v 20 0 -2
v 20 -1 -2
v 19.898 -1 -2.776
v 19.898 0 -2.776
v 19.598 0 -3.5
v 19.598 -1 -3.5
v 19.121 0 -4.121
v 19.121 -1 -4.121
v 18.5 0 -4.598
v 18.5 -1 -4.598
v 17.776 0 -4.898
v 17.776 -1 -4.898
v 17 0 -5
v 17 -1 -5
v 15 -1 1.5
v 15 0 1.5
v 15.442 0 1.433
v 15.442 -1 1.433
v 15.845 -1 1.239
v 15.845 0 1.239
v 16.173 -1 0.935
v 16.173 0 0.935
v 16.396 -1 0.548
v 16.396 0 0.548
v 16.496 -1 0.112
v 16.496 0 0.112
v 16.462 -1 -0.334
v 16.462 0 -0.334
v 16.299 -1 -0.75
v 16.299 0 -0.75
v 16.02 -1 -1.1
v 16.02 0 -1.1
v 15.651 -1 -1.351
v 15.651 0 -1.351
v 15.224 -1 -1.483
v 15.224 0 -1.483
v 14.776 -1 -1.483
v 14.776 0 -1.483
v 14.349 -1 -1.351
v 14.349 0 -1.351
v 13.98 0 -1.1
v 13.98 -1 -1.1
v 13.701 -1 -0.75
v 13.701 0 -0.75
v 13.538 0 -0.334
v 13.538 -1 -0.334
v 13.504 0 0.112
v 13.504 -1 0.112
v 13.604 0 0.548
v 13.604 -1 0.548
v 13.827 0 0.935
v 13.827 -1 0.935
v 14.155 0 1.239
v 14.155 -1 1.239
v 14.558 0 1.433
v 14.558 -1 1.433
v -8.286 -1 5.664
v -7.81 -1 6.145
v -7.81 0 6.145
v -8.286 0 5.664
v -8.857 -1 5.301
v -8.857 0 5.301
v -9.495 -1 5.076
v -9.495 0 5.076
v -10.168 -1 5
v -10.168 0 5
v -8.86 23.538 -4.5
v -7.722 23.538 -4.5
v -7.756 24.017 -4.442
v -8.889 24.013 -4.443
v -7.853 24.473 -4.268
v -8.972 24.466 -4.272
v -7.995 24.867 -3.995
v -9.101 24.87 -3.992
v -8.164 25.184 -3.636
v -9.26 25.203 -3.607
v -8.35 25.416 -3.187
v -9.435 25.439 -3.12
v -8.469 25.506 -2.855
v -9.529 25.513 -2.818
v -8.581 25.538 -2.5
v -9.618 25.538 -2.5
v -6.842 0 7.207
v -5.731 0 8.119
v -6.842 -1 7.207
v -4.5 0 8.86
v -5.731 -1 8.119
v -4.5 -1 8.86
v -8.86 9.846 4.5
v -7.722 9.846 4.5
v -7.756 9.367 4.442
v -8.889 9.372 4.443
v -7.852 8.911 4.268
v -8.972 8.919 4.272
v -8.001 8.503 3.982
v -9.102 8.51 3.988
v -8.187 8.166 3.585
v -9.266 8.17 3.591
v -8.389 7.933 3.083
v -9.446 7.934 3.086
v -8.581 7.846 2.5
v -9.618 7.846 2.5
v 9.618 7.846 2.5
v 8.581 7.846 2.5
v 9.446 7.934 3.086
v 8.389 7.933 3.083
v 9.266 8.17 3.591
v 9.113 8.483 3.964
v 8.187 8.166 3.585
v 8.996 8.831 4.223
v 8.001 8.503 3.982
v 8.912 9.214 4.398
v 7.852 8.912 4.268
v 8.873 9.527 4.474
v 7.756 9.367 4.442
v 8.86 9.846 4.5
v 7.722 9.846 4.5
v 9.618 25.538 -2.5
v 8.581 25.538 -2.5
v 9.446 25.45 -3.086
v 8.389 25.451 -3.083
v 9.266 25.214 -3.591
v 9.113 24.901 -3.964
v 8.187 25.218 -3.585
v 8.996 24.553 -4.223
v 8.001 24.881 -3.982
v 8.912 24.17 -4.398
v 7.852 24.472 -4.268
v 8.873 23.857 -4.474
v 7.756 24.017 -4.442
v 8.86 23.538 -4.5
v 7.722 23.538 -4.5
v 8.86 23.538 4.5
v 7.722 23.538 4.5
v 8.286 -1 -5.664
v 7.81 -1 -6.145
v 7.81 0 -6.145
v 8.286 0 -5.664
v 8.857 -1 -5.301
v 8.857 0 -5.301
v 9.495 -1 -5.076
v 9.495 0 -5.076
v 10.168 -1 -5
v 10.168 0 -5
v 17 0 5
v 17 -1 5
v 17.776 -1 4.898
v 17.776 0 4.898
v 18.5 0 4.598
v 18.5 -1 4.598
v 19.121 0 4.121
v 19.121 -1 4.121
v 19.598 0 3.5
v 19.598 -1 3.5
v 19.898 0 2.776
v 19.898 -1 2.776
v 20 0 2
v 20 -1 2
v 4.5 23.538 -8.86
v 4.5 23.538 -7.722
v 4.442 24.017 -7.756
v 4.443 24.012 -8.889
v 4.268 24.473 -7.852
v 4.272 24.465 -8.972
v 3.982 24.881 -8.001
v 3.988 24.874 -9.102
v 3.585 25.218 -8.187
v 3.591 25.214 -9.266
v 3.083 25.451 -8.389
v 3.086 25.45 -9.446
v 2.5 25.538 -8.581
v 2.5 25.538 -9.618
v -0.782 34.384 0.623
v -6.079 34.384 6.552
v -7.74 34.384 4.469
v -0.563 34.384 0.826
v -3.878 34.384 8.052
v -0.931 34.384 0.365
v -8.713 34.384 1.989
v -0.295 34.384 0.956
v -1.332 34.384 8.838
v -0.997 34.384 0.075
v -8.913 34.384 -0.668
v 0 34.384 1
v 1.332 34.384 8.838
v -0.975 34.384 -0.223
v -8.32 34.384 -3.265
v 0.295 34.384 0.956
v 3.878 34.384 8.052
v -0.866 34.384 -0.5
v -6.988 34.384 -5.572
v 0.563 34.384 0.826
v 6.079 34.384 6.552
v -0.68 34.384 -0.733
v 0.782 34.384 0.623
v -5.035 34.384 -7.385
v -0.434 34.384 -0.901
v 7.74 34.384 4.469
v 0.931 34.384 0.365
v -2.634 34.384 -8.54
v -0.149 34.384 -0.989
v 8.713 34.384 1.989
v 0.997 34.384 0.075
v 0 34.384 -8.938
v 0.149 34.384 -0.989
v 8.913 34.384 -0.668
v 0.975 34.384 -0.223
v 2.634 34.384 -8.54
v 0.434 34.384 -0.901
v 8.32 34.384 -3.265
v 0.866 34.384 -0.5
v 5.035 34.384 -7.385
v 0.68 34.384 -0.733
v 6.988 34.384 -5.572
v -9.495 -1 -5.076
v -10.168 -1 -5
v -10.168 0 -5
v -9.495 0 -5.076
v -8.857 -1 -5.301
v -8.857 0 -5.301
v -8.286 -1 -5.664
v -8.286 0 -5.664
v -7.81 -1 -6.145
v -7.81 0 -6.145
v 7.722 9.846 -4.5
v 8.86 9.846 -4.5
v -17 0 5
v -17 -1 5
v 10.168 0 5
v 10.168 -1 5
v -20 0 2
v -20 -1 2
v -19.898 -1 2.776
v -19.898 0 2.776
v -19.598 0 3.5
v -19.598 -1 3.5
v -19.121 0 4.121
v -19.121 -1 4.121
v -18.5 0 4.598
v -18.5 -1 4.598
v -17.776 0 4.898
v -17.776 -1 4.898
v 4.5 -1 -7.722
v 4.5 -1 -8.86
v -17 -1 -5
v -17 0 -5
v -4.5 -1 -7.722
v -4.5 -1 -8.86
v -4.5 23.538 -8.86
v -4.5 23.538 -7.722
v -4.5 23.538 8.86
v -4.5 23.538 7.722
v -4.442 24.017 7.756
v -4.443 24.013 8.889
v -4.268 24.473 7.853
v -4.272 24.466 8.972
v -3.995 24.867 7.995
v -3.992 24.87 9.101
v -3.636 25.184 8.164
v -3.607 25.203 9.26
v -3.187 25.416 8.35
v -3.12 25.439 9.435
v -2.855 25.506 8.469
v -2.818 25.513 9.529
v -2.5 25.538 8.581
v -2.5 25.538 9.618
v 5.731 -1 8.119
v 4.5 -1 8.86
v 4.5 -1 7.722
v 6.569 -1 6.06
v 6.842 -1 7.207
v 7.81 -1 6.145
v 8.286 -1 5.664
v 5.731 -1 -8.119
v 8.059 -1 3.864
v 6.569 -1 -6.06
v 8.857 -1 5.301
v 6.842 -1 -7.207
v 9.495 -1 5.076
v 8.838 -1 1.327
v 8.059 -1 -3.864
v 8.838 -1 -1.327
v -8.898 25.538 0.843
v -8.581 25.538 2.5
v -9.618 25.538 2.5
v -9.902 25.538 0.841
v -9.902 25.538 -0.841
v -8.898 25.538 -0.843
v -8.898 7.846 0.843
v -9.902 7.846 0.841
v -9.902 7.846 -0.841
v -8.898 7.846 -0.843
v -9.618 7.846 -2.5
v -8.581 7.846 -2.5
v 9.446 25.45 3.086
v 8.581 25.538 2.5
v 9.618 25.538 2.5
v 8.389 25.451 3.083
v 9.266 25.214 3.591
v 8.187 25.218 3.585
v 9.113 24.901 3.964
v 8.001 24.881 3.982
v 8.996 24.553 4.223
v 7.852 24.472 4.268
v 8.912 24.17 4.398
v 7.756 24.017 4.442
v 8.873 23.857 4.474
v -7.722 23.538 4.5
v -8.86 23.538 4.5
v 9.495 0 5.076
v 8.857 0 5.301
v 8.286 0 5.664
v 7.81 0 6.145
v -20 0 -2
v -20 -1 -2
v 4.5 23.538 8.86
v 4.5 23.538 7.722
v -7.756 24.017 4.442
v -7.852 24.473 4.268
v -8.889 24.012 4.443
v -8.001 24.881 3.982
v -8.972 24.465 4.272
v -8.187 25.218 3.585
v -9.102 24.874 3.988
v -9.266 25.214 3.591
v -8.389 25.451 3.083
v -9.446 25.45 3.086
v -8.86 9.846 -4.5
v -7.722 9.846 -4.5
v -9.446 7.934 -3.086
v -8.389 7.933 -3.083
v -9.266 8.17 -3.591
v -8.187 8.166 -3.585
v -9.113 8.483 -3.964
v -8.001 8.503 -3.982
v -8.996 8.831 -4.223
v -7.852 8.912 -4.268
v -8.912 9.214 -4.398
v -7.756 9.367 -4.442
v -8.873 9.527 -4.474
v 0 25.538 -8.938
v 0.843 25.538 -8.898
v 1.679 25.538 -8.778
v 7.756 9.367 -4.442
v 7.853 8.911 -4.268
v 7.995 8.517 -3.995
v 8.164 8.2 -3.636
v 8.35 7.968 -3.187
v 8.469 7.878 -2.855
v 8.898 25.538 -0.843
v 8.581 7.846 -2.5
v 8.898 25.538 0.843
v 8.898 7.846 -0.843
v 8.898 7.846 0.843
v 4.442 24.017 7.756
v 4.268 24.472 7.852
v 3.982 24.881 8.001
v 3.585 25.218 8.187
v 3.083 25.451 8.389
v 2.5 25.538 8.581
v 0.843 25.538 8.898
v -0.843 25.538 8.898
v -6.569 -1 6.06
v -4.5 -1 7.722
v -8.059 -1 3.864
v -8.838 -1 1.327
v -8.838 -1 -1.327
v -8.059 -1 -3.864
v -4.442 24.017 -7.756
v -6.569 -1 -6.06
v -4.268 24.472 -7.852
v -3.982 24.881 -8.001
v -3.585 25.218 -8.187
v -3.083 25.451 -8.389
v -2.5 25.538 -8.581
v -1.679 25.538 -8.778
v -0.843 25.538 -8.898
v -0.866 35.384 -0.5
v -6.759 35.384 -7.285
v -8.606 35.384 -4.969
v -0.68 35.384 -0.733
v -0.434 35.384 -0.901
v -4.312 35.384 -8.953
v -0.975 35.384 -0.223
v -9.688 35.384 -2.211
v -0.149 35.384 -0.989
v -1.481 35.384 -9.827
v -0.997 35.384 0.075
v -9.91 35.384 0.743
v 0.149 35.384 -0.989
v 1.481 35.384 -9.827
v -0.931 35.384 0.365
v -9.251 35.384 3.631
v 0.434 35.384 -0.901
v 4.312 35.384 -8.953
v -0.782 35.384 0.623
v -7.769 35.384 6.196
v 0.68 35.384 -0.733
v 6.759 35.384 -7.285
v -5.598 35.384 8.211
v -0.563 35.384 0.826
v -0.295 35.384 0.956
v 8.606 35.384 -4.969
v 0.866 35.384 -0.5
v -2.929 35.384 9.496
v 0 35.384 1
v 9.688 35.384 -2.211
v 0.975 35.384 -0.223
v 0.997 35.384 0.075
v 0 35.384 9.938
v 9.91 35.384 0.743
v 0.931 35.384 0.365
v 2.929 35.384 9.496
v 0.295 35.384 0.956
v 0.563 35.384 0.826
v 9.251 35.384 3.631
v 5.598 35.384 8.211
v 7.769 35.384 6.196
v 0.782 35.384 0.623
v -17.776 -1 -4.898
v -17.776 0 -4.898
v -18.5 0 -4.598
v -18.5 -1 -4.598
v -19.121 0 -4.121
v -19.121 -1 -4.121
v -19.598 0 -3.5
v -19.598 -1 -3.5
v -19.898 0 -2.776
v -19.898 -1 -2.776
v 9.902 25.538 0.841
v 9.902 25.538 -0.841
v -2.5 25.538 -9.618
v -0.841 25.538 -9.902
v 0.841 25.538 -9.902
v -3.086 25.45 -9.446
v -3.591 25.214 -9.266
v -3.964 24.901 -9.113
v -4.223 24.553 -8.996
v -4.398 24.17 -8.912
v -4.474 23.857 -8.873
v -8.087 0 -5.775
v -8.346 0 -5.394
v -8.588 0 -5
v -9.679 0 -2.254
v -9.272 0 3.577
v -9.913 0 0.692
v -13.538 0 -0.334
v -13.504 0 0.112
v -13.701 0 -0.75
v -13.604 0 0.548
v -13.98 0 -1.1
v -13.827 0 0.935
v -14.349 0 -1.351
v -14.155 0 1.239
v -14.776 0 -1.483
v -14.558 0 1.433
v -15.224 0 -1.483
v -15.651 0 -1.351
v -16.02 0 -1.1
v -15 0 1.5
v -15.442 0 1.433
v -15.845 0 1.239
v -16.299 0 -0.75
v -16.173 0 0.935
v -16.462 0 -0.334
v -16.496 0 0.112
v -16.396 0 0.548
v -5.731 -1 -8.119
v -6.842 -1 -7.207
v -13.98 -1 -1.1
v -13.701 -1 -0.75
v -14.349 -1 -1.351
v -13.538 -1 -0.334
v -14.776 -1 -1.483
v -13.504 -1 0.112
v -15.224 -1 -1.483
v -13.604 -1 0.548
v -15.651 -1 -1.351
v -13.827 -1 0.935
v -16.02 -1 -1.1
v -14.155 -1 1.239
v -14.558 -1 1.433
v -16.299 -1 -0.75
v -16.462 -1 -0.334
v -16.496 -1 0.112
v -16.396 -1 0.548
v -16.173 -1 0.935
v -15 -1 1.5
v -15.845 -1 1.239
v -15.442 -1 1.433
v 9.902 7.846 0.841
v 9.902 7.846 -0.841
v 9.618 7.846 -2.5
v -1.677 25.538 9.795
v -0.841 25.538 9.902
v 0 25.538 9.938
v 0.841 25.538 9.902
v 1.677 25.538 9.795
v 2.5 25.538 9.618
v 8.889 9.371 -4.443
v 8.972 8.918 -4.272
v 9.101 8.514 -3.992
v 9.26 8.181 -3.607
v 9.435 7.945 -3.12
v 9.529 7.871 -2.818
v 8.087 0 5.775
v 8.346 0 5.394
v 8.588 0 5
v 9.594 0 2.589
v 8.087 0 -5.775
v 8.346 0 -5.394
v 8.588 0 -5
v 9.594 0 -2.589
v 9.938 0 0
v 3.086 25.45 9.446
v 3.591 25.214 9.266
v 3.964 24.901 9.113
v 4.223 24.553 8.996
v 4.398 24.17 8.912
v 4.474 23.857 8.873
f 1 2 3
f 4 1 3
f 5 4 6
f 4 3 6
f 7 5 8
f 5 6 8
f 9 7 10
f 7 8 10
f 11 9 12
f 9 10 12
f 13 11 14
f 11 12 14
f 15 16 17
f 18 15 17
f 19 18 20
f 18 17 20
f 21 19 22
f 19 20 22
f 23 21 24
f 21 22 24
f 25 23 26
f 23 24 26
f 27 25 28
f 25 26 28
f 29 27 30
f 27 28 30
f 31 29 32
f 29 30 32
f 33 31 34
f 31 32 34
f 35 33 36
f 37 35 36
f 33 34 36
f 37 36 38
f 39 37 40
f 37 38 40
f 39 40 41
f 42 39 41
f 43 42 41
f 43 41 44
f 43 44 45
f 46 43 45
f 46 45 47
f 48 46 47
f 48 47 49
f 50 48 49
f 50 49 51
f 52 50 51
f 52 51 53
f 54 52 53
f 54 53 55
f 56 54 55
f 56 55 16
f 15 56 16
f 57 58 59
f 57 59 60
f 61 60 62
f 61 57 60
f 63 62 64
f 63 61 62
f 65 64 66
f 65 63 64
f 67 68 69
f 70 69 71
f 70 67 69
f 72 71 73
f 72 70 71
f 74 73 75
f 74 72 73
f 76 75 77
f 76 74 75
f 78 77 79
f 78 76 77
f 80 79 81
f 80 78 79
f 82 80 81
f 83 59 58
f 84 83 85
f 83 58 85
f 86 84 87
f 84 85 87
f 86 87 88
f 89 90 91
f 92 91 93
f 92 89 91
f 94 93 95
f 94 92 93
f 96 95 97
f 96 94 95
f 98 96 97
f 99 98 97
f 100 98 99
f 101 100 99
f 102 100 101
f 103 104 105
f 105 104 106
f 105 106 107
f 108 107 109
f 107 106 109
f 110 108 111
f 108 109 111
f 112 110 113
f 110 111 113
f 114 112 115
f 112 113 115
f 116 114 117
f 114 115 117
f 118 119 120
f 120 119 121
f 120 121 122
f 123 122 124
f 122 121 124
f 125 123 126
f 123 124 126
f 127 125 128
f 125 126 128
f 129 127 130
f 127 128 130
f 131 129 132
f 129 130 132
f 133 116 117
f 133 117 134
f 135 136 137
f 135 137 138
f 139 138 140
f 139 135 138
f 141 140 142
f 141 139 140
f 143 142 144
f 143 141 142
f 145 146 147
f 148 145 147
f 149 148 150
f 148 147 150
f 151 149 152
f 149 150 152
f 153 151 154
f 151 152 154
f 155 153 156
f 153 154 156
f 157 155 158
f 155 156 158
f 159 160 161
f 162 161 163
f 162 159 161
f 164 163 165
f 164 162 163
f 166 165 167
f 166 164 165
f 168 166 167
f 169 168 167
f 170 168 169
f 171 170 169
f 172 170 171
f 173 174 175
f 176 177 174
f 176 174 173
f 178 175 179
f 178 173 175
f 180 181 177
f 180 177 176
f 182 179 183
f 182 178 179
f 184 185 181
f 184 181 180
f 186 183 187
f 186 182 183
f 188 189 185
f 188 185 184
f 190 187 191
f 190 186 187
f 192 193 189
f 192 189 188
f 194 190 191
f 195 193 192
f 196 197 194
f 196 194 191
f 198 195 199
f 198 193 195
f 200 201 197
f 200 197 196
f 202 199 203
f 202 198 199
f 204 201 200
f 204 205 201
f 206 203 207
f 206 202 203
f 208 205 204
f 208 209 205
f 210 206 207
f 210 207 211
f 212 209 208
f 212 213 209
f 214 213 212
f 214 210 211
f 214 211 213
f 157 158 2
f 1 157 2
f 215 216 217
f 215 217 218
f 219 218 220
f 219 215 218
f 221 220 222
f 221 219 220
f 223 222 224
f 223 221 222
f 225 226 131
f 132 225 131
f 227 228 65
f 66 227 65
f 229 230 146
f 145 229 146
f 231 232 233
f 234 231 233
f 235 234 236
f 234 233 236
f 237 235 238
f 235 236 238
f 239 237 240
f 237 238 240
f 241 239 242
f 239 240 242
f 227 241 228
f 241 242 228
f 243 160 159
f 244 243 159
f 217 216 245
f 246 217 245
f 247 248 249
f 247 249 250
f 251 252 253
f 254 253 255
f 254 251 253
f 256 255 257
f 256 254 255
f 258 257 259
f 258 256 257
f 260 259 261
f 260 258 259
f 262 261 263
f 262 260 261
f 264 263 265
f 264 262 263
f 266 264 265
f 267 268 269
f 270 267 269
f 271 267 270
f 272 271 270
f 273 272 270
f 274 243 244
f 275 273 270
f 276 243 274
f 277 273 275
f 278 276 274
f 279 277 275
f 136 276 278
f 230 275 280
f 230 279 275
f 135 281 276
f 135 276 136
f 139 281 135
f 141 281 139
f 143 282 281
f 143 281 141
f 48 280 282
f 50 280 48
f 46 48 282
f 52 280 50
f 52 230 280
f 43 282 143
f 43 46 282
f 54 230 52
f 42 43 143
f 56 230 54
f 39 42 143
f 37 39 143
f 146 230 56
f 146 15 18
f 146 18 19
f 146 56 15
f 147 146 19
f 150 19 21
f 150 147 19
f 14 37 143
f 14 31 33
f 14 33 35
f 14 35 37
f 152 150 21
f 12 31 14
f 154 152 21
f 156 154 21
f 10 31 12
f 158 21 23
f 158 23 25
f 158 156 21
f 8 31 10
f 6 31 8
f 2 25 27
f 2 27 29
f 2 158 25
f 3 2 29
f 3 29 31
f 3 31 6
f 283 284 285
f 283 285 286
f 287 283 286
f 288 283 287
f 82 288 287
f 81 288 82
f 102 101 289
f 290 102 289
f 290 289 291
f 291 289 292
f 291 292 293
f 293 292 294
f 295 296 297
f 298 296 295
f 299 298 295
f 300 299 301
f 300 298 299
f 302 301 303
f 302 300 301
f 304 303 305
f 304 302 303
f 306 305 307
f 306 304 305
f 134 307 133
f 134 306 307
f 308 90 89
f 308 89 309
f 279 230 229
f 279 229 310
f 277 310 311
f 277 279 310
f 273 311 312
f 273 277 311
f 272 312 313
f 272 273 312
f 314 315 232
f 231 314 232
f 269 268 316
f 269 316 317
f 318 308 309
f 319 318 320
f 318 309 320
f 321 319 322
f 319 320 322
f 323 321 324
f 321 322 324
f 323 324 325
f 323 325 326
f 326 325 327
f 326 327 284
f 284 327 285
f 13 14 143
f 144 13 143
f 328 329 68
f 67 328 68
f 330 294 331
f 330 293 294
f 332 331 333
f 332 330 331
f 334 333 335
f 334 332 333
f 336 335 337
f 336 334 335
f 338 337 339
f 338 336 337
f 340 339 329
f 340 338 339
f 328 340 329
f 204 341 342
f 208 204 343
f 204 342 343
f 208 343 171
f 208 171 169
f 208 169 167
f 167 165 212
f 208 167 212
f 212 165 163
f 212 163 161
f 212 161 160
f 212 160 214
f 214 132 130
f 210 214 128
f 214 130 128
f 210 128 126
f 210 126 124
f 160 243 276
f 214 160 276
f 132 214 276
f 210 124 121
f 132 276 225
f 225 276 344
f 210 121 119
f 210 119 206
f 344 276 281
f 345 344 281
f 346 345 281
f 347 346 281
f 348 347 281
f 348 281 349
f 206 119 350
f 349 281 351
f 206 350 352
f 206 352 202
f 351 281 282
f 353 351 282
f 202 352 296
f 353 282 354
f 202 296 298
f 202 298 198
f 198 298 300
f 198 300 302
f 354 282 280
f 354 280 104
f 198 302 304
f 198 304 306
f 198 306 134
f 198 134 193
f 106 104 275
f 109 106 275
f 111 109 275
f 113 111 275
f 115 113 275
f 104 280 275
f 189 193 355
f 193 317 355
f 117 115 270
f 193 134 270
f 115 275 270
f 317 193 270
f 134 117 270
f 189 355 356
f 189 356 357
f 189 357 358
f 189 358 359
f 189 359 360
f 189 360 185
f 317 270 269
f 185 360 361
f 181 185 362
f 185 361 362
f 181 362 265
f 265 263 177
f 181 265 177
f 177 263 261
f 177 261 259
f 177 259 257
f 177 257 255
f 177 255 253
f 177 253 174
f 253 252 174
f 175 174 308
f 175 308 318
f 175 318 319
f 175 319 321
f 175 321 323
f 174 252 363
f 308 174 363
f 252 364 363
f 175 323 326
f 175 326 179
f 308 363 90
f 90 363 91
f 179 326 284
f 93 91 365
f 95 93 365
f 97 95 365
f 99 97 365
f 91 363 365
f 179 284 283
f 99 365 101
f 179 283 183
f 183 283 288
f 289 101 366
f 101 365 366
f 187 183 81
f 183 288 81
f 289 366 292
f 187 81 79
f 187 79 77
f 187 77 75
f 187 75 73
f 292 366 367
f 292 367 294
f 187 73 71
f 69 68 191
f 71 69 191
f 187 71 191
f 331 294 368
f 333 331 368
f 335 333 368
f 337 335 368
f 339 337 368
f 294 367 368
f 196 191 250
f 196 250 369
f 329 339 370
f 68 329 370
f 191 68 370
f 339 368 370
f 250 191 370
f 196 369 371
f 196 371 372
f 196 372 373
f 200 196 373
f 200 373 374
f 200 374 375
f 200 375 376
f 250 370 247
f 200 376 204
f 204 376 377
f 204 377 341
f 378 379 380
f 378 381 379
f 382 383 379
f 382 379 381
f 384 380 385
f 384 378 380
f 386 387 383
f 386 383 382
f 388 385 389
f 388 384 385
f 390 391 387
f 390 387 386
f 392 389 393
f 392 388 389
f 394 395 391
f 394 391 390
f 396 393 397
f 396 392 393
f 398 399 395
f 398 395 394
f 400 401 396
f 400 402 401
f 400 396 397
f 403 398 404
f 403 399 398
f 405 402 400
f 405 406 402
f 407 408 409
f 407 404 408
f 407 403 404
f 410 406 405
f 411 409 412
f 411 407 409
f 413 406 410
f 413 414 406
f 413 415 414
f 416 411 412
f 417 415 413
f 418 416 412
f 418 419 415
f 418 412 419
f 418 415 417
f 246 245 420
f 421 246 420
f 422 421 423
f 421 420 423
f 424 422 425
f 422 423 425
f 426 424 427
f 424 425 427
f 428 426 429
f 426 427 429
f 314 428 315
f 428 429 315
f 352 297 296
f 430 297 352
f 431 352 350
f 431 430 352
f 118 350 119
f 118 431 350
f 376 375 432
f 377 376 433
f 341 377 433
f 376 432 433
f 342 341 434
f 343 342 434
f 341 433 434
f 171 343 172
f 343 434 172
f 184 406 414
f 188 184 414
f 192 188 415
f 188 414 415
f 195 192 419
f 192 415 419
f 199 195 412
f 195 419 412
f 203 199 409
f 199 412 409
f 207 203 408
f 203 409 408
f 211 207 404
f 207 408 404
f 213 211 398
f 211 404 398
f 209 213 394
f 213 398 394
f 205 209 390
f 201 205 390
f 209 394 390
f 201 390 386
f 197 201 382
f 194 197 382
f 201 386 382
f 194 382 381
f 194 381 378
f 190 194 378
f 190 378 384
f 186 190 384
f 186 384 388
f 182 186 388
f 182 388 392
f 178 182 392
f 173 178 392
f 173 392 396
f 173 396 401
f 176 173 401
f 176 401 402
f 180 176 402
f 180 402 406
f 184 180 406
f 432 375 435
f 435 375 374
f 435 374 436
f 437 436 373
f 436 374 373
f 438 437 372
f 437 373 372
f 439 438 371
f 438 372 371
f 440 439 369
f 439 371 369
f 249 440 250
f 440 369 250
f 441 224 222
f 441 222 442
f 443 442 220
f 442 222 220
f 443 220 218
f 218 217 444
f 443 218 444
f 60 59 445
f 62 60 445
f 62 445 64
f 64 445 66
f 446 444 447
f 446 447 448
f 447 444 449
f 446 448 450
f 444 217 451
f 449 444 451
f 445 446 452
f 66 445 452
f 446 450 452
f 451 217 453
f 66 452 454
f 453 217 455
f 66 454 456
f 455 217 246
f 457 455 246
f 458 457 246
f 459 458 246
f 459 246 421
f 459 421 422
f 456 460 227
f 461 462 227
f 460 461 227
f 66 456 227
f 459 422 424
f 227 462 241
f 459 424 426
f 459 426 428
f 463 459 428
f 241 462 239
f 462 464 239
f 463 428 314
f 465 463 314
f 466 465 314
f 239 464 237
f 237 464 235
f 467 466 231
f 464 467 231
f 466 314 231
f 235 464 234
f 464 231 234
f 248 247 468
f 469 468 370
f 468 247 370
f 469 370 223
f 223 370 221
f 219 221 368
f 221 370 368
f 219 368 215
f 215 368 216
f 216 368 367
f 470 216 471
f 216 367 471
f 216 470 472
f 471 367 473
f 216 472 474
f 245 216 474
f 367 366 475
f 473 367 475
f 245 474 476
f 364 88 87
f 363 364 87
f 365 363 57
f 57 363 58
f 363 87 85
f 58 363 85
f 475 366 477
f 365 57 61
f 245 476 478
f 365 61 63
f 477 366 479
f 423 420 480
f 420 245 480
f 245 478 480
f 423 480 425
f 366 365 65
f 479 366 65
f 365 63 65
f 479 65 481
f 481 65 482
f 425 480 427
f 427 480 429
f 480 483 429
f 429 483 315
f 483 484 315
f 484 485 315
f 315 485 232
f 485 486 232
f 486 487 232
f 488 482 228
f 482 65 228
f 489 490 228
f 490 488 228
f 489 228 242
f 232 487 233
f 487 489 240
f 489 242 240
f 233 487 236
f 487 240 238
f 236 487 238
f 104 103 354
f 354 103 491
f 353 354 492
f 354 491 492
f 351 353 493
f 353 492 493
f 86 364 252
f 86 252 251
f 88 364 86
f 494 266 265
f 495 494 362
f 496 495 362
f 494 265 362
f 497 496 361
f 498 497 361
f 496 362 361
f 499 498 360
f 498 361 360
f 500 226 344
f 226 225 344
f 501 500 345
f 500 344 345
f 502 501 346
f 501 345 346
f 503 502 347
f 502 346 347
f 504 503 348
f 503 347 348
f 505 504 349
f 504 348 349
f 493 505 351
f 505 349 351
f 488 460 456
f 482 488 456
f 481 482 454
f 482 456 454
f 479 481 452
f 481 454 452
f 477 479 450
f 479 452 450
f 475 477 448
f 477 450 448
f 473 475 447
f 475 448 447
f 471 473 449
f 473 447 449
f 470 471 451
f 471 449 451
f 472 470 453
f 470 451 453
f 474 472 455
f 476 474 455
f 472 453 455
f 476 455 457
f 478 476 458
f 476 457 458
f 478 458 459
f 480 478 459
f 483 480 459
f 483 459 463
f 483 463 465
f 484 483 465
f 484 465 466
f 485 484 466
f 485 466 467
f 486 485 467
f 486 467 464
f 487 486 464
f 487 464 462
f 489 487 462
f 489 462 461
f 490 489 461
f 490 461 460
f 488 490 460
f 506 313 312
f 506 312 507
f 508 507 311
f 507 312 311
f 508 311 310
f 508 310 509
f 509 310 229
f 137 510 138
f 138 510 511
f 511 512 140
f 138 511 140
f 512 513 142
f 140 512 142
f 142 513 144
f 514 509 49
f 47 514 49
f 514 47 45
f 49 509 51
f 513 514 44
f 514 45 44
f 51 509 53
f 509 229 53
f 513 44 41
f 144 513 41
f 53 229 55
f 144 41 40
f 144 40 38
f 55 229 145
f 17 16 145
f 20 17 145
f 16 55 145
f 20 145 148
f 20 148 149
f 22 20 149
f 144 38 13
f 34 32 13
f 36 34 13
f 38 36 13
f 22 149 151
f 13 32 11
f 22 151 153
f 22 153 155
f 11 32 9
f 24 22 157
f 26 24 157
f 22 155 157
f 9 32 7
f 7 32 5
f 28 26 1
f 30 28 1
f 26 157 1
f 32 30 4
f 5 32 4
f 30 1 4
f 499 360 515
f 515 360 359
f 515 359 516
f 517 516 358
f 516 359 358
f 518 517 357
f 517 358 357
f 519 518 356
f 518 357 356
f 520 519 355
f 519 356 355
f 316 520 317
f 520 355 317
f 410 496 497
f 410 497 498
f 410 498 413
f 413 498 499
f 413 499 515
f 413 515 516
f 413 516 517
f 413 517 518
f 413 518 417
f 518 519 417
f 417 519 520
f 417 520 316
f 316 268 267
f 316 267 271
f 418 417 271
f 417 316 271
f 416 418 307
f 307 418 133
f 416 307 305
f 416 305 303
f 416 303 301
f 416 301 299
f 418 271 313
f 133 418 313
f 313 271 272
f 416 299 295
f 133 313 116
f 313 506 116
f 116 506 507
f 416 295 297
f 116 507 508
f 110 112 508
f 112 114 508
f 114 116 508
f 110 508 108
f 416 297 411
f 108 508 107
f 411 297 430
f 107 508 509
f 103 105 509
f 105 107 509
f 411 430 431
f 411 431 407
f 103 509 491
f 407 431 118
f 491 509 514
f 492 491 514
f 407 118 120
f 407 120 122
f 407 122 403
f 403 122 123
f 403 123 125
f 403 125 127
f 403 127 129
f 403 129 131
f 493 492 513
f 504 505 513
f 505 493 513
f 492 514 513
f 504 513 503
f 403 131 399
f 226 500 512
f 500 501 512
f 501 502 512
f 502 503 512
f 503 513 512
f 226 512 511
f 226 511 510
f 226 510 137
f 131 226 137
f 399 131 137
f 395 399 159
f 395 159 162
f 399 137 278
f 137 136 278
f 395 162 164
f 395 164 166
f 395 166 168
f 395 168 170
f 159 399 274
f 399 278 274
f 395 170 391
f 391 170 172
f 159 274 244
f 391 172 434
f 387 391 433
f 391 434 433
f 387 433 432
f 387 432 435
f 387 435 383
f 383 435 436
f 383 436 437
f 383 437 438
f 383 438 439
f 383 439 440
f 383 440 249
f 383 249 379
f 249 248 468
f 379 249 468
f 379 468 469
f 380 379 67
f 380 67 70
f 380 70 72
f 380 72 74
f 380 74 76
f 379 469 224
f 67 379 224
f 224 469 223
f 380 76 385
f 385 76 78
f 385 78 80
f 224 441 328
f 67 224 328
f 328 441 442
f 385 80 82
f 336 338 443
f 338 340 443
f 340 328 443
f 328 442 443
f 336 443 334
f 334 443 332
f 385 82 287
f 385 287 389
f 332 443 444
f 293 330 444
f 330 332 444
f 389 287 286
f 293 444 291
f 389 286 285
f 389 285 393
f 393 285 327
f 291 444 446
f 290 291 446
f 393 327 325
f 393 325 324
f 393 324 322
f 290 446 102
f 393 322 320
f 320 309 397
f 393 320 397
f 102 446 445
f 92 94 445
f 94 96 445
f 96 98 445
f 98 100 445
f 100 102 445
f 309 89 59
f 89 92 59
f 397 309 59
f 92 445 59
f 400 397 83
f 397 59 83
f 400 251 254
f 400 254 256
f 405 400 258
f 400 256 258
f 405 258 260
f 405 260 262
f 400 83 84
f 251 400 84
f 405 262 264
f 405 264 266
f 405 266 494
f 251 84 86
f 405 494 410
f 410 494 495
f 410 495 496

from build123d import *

# Parameters (mm, degrees)
SKETCH2_R           = 9.9375
BOSS_EXTRUDE1_DEPTH = 35.384
SKETCH4_R           = 1
CUT_EXTRUDE2_DEPTH  = 39.072762817
BOSS_EXTRUDE2_START = 1
SKETCH11_R          = 8.9375
BOSS_EXTRUDE2_DEPTH = 1
SKETCH12_R          = 8.9375
CUT_EXTRUDE7_DEPTH  = 34.384
CUT_EXTRUDE8_START  = -1
CUT_EXTRUDE8_DEPTH  = 26.538
SKETCH14_W          = 9
SKETCH14_H          = 17.692
CUT_EXTRUDE9_DEPTH  = 63.054664307
FILLET3_R           = 2
FILLET4_R           = 3
CUT_EXTRUDE10_REACH = 43.842
SKETCH15_R          = 1.5


# Read off the part's stored shape, not the designer's step: Cut-Extrude8
with BuildPart() as part:
    # Sketch2 → Boss-Extrude1 (new body)
    with BuildSketch(Plane(origin=(0, 0, 0), x_dir=(1, 0, 0), z_dir=(0, 1, 0))):
        with Locations(Location((0, 0, 0), (0, 0, 270))):
            Circle(SKETCH2_R)
    extrude(amount=BOSS_EXTRUDE1_DEPTH)

    # Sketch4 → Cut-Extrude2 (cut, through all)
    with BuildSketch(Plane(origin=(0, 35.384, 0), x_dir=(1, 0, 0), z_dir=(0, 1, 0))):
        with Locations(Location((0, 0, 0), (0, 0, 270))):
            Circle(SKETCH4_R)
    extrude(amount=-CUT_EXTRUDE2_DEPTH, mode=Mode.SUBTRACT)

    # Sketch11 → Boss-Extrude2 (add)
    with BuildSketch(Plane.XZ.offset(BOSS_EXTRUDE2_START)):
        with BuildLine():
            Line((8.588009446, 5), (20, 5))
            Line((20, 5), (20, -5))
            Line((20, -5), (8.588009446, -5))
            ThreePointArc((8.588009446, -5), (0, -9.9375), (-8.588009446, -5))
            Line((-8.588009446, -5), (-20, -5))
            Line((-20, -5), (-20, 5))
            Line((-20, 5), (-8.588009446, 5))
            ThreePointArc((-8.588009446, 5), (0, 9.9375), (8.588009446, 5))
        make_face()
        with Locations(Location((0, 0, 0), (0, 0, 270))):
            Circle(SKETCH11_R, mode=Mode.SUBTRACT)
    extrude(amount=-BOSS_EXTRUDE2_DEPTH)

    # Sketch12 → Cut-Extrude7 (cut)
    with BuildSketch(Plane.XZ):
        with Locations(Location((0, 0, 0), (0, 0, 270))):
            Circle(SKETCH12_R)
    extrude(amount=-CUT_EXTRUDE7_DEPTH, mode=Mode.SUBTRACT)

    # Cut-Extrude8 outline → Cut-Extrude8 (cut)
    with BuildSketch(Plane(origin=(0, 0, 0), x_dir=(1, 0, 0), z_dir=(0, 1, 0)).offset(CUT_EXTRUDE8_START)):
        with BuildLine():
            ThreePointArc((4.5, -7.721975541), (0, -8.9375), (-4.5, -7.721975541))
            Line((-4.5, -7.721975541), (-4.5, -8.860243013))
            ThreePointArc((-4.5, -8.860243013), (0, -9.9375), (4.5, -8.860243013))
            Line((4.5, -8.860243013), (4.5, -7.721975541))
        make_face()
        with BuildLine():
            Line((-4.5, 8.860243013), (-4.5, 7.721975541))
            ThreePointArc((-4.5, 7.721975541), (0, 8.9375), (4.5, 7.721975541))
            Line((4.5, 7.721975541), (4.5, 8.860243013))
            ThreePointArc((4.5, 8.860243013), (0, 9.9375), (-4.5, 8.860243013))
        make_face()
    extrude(amount=CUT_EXTRUDE8_DEPTH, mode=Mode.SUBTRACT)

    # Sketch14 → Cut-Extrude9 (cut, through all)
    with BuildSketch(Plane(origin=(30, 0, 0), x_dir=(0, 0, -1), z_dir=(1, 0, 0))):
        with Locations((0, 16.692)):
            Rectangle(SKETCH14_W, SKETCH14_H)
    extrude(amount=-CUT_EXTRUDE9_DEPTH, mode=Mode.SUBTRACT)

    # Fillet3
    fillet3_edges = [part.edges().sort_by_distance(p)[0] for p in [
        (4.5, 25.538, 8.291109277),
        (4.5, 25.538, -8.291109277),
        (-4.5, 25.538, -8.291109277),
        (-4.5, 25.538, 8.291109277),
        (8.291109277, 25.538, -4.5),
        (-8.291109277, 25.538, -4.5),
        (8.291109277, 7.846, -4.5),
        (-8.291109277, 7.846, -4.5),
        (-8.291109277, 7.846, 4.5),
        (8.291109277, 7.846, 4.5),
        (8.291109277, 25.538, 4.5),
        (-8.291109277, 25.538, 4.5),
    ]]
    fillet(fillet3_edges, radius=FILLET3_R)

    # Fillet4
    # the kernel refuses this fillet: 3 mm, written as the material it adds along each edge
    with BuildSketch(Plane(origin=(8.588009446, -1, -5), x_dir=(-0.562116261978449, 0, -0.8270582252897166), z_dir=(0, 1, 0)), Plane(origin=(-8.588009446, -1, 5), x_dir=(0.5621162619784511, 0, 0.8270582252897152), z_dir=(0, 1, 0))) as fillet4_piece_1:
        with BuildLine():
            CenterArc((1.593293854, -2.992714011), FILLET4_R, 93.994010432, 51.803711499)
            Line((-0.887880822, -1.306365225), (0, 0))
            ThreePointArc((0, 0), (0.692168641, -0.024134839), (1.384337283, 0))
        make_face()
    extrude(amount=1)
    with BuildSketch(Plane(origin=(8.588009446, -1, 5), x_dir=(-0.5621162619784463, 0, 0.8270582252897184), z_dir=(0, 1, 0)), Plane(origin=(-8.588009446, -1, -5), x_dir=(0.5621162619784531, 0, -0.8270582252897138), z_dir=(0, 1, 0))) as fillet4_piece_2:
        with BuildLine():
            CenterArc((1.593293854, 2.992714011), FILLET4_R, 214.20227807, 51.803711499)
            Line((-0.887880822, 1.306365225), (0, 0))
            ThreePointArc((0, 0), (0.692168641, 0.024134839), (1.384337283, 0))
        make_face()
    extrude(amount=1)
    # the kernel refuses this fillet: 3 mm, written as the material it takes off along each edge
    with BuildSketch(Plane(origin=(20, -8.5, -5), x_dir=(0, 0, 1), z_dir=(0, 1, 0)), Plane(origin=(20, -8.5, 5), x_dir=(-1, 0, 0), z_dir=(0, 1, 0))) as fillet4_2_piece_1:
        with BuildLine():
            CenterArc((FILLET4_R, -FILLET4_R), FILLET4_R, 90, 90)
            Line((0, -FILLET4_R), (0, 0))
            Line((0, 0), (FILLET4_R, 0))
        make_face()
    extrude(amount=16, mode=Mode.SUBTRACT)
    with BuildSketch(Plane(origin=(-20, -8.5, 5), x_dir=(1, 0, 0), z_dir=(0, 1, 0)), Plane(origin=(-20, -8.5, -5), x_dir=(0, 0, 1), z_dir=(0, 1, 0))) as fillet4_2_piece_2:
        with BuildLine():
            CenterArc((FILLET4_R, FILLET4_R), FILLET4_R, 180, 90)
            Line((0, FILLET4_R), (0, 0))
            Line((0, 0), (FILLET4_R, 0))
        make_face()
    extrude(amount=16, mode=Mode.SUBTRACT)

    # Sketch15 → Cut-Extrude10 (cut, up to next)
    with BuildSketch(Plane(origin=(0, 0, 0), x_dir=(1, 0, 0), z_dir=(0, 1, 0)), mode=Mode.PRIVATE) as cut_extrude10_sk1:
        with Locations(Location((-15, 0, 0), (0, 0, 270))):
            Circle(SKETCH15_R)
    cut_extrude10_tool1 = extrude(cut_extrude10_sk1.sketch, amount=-CUT_EXTRUDE10_REACH, mode=Mode.PRIVATE) & part.part
    # Sketch15 → Cut-Extrude10 (cut, up to next)
    with BuildSketch(Plane(origin=(0, 0, 0), x_dir=(1, 0, 0), z_dir=(0, 1, 0)), mode=Mode.PRIVATE) as cut_extrude10_sk2:
        with Locations(Location((15, 0, 0), (0, 0, 270))):
            Circle(SKETCH15_R)
    cut_extrude10_tool2 = extrude(cut_extrude10_sk2.sketch, amount=-CUT_EXTRUDE10_REACH, mode=Mode.PRIVATE) & part.part
    add(cut_extrude10_tool1.solids().sort_by_distance((-15, 0, 0))[0], mode=Mode.SUBTRACT)
    add(cut_extrude10_tool2.solids().sort_by_distance((15, 0, 0))[0], mode=Mode.SUBTRACT)


solid = part.part
